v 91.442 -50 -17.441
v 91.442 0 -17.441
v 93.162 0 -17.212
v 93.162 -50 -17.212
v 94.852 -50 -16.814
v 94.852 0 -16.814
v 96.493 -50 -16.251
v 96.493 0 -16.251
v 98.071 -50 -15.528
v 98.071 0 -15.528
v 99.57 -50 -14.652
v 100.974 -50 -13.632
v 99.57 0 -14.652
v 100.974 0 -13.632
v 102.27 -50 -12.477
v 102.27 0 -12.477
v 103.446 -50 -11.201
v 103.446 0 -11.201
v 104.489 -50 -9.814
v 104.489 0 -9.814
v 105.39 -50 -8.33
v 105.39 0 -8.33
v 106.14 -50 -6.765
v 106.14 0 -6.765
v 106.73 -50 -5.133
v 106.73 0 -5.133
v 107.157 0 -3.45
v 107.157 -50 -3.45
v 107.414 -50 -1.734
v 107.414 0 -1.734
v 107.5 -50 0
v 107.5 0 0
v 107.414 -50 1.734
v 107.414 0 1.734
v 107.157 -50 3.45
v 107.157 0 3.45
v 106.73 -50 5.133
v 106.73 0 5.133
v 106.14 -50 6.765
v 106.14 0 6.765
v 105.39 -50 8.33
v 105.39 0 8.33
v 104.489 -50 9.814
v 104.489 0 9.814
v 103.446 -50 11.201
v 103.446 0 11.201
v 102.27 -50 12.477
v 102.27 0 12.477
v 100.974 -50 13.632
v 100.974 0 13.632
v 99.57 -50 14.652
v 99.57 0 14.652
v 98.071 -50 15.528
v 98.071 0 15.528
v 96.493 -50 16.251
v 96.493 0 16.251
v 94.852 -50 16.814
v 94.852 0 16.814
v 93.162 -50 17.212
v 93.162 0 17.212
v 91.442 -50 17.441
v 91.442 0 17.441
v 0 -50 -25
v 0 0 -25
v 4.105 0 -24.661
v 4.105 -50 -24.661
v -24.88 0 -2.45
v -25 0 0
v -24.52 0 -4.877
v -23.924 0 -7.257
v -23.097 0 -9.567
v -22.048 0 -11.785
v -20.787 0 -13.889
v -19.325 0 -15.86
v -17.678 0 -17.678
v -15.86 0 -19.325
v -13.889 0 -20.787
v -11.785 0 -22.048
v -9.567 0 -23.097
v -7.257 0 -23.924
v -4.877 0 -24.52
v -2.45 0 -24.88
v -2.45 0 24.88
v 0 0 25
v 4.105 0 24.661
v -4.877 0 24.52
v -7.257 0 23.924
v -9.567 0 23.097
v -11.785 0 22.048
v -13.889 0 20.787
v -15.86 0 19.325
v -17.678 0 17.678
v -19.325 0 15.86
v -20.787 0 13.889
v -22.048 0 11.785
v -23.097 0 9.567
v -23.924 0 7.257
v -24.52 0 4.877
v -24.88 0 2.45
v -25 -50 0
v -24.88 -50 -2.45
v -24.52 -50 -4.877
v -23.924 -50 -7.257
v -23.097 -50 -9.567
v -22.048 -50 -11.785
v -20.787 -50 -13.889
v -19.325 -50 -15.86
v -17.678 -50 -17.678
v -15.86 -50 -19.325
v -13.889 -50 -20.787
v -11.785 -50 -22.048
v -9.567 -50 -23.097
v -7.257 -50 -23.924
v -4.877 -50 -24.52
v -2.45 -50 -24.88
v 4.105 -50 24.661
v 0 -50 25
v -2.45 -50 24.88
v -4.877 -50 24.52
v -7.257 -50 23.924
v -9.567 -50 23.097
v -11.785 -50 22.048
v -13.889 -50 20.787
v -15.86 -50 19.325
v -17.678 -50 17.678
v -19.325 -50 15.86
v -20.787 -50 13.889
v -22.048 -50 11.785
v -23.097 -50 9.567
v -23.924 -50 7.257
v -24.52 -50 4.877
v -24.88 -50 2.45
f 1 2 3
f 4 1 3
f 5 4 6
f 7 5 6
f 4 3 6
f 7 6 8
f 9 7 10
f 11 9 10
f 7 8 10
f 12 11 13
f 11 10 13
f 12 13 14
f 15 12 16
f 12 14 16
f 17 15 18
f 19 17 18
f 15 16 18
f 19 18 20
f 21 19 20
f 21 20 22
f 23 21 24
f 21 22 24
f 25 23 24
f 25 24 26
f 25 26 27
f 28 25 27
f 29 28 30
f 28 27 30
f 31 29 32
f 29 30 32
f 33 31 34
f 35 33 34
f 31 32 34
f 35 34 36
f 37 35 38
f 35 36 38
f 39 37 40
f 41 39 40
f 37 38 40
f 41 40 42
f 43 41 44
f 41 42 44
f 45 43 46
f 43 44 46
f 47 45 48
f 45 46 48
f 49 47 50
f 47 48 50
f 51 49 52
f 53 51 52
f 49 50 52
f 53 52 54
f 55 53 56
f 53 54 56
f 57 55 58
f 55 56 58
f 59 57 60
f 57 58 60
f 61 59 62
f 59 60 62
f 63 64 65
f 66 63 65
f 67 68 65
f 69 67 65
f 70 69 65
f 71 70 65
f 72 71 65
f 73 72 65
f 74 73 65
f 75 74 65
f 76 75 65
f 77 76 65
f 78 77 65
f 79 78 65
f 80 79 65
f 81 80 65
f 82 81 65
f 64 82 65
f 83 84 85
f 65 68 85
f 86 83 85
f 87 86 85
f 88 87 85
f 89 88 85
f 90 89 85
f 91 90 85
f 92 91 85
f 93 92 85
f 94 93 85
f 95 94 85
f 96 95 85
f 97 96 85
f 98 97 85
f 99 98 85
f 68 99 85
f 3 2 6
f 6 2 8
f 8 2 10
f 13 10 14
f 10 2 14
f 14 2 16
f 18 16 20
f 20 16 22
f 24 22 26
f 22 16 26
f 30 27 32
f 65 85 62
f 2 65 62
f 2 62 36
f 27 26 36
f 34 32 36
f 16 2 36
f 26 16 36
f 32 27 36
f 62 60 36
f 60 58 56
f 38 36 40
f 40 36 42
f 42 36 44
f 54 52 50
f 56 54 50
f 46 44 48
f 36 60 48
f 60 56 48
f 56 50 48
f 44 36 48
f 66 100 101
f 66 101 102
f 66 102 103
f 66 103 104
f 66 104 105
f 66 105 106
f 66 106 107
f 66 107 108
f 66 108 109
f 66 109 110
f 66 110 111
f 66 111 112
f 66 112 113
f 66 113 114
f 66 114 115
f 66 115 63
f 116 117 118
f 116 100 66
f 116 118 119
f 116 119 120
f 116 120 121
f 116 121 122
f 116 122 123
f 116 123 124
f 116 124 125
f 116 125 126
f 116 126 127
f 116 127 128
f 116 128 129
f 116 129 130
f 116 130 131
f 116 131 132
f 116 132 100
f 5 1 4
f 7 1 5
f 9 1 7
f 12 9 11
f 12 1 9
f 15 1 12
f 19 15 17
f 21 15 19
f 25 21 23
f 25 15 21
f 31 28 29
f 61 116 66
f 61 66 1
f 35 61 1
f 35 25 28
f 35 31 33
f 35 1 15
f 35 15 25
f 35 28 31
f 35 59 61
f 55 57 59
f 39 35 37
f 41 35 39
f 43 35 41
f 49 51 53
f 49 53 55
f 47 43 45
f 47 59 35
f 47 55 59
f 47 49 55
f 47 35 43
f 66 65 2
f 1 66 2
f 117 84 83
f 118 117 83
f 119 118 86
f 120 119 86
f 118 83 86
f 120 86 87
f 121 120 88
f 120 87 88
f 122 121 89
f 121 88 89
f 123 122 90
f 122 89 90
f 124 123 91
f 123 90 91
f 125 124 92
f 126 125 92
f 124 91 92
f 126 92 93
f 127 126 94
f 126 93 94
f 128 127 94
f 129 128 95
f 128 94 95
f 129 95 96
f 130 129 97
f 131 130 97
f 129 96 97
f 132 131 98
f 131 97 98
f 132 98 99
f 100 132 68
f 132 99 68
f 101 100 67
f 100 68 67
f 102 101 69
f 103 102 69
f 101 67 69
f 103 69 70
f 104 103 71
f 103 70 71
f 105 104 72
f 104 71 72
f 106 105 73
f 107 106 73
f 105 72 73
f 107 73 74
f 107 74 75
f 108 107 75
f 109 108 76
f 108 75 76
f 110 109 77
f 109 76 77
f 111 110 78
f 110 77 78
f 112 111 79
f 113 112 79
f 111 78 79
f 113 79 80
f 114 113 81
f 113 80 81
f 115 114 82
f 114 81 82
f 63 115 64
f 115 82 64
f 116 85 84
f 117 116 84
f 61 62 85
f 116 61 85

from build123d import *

# Parameters (mm, degrees)
F1_DEPTH = 50


with BuildPart() as f1:
    # F0 (on Front) → F1 (new body)
    with BuildSketch(Plane.XZ):
        with BuildLine():
            Line((91.4418067738, 17.4405043857), (4.1054428346, 24.6606029758))
            ThreePointArc((4.1054428346, 24.6606029758), (19.0740146648, 16.1611251022), (25, 0))
            ThreePointArc((25, 0), (19.0740146648, -16.1611251022), (4.1054428346, -24.6606029758))
            Line((4.1054428346, -24.6606029758), (91.4418067738, -17.4405043857))
            ThreePointArc((91.4418067738, -17.4405043857), (72.5, 0), (91.4418067738, 17.4405043857))
        make_face()
        with BuildLine():
            Line((4.1054428346, 24.6606029758), (0, 25))
            ThreePointArc((0, 25), (-25, 0), (0, -25))
            Line((0, -25), (4.1054428346, -24.6606029758))
            ThreePointArc((4.1054428346, -24.6606029758), (19.0740146648, -16.1611251022), (25, 0))
            ThreePointArc((25, 0), (19.0740146648, 16.1611251022), (4.1054428346, 24.6606029758))
        make_face()
        with BuildLine():
            ThreePointArc((107.5, 0), (102.8740362463, 11.8536572723), (91.4418067738, 17.4405043857))
            ThreePointArc((91.4418067738, 17.4405043857), (72.5, 0), (91.4418067738, -17.4405043857))
            ThreePointArc((91.4418067738, -17.4405043857), (102.8740362463, -11.8536572723), (107.5, 0))
        make_face()
    extrude(amount=F1_DEPTH)


solid = f1.part
